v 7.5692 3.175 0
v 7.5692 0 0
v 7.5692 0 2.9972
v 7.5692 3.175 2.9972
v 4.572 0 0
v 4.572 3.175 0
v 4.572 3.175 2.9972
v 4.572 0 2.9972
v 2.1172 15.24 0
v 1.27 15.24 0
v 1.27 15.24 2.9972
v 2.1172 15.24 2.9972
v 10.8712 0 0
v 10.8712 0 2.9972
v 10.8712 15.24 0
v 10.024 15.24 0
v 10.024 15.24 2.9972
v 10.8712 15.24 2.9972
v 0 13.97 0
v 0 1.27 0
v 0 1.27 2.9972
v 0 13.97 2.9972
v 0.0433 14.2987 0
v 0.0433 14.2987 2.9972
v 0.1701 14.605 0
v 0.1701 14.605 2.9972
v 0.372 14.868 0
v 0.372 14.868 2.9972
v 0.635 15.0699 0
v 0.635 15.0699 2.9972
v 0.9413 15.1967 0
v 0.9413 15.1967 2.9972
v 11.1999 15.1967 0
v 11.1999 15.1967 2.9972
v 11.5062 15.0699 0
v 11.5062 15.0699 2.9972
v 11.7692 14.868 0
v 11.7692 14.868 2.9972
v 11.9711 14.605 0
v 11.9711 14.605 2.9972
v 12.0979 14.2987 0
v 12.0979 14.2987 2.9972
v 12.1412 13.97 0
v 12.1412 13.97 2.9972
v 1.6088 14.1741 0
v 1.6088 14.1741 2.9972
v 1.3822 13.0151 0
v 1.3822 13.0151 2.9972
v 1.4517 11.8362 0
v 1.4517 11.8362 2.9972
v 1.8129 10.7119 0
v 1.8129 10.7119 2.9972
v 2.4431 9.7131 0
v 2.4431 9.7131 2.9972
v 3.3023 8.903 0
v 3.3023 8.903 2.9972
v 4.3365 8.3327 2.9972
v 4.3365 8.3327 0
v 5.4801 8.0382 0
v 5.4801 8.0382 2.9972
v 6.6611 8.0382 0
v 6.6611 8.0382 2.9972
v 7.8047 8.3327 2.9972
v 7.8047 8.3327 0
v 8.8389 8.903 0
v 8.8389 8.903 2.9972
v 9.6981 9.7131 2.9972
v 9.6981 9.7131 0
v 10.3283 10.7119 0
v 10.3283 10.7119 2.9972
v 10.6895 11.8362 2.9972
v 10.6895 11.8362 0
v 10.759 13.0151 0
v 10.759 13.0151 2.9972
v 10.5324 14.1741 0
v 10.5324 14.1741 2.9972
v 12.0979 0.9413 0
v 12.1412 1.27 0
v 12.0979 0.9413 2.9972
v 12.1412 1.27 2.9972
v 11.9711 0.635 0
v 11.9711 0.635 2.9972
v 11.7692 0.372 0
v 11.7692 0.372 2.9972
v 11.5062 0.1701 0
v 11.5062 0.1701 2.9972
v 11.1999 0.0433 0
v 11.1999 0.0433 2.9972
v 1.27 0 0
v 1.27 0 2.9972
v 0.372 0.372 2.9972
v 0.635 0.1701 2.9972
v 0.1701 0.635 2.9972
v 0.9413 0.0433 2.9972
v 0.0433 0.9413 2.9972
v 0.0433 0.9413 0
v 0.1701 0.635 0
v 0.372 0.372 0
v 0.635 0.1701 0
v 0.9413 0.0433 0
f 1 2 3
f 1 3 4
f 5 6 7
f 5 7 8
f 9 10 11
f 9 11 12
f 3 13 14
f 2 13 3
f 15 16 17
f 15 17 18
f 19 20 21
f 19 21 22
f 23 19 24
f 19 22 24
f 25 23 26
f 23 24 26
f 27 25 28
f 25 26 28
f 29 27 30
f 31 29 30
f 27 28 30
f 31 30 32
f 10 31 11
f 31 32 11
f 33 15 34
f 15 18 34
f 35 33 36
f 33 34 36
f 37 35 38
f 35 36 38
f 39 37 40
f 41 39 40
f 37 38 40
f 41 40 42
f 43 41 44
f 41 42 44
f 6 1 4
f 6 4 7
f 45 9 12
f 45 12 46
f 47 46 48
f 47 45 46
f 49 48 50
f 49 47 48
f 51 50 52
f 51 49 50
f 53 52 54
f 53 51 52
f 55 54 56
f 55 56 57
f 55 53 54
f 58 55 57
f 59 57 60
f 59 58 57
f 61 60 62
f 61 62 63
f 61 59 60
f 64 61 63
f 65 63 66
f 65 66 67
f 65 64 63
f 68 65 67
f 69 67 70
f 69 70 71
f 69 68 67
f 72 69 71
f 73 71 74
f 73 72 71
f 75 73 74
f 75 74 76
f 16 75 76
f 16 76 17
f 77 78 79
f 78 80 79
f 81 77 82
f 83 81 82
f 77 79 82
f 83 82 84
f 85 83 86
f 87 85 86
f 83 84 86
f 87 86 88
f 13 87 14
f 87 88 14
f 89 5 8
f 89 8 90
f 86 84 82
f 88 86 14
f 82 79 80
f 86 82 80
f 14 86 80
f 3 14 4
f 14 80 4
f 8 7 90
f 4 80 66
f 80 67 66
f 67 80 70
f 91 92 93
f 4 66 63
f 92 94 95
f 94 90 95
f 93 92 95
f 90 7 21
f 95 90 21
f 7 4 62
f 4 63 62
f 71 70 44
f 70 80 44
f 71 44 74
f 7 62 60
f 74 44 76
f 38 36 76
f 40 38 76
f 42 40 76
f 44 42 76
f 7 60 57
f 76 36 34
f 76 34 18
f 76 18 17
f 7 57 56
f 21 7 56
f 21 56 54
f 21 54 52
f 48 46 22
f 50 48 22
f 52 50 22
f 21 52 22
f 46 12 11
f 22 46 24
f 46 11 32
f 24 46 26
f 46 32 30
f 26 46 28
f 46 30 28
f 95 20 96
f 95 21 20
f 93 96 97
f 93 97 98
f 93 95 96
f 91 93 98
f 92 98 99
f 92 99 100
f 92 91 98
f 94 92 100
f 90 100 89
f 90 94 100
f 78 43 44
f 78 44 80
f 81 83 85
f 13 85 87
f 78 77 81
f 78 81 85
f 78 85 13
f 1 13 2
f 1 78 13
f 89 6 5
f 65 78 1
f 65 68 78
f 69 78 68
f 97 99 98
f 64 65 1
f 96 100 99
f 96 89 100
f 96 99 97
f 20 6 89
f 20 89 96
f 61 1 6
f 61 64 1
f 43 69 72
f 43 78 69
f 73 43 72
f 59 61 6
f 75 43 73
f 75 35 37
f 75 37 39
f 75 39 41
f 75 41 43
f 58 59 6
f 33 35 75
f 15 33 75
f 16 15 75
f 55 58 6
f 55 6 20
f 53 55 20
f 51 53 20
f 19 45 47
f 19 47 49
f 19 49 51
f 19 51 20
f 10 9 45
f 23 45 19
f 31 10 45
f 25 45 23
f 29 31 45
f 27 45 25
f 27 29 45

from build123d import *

# Parameters (mm, degrees)
BOSS_EXTRUDE1_DEPTH = 2.9972
FILLET1_R           = 1.27


with BuildPart() as part:
    # Sketch1 → Boss-Extrude1 (new body)
    with BuildSketch(Plane.XY):
        with BuildLine():
            Line((0, 0), (0, 15.24))
            Line((0, 15.24), (2.117246866, 15.24))
            ThreePointArc((2.117246866, 15.24), (6.0706, 8.001), (10.023953134, 15.24))
            Line((10.023953134, 15.24), (12.1412, 15.24))
            Line((12.1412, 15.24), (12.1412, 0))
            Line((12.1412, 0), (7.5692, 0))
            Line((7.5692, 0), (7.5692, 3.175))
            Line((7.5692, 3.175), (4.572, 3.175))
            Line((4.572, 3.175), (4.572, 0))
            Line((4.572, 0), (0, 0))
        make_face()
    extrude(amount=BOSS_EXTRUDE1_DEPTH)

    # Fillet1
    fillet1_edges = [part.edges().sort_by_distance(p)[0] for p in [
        (0, 0, 1.4986),
        (0, 15.24, 1.4986),
        (12.1412, 15.24, 1.4986),
        (12.1412, 0, 1.4986),
    ]]
    fillet(fillet1_edges, radius=FILLET1_R)


solid = part.part
